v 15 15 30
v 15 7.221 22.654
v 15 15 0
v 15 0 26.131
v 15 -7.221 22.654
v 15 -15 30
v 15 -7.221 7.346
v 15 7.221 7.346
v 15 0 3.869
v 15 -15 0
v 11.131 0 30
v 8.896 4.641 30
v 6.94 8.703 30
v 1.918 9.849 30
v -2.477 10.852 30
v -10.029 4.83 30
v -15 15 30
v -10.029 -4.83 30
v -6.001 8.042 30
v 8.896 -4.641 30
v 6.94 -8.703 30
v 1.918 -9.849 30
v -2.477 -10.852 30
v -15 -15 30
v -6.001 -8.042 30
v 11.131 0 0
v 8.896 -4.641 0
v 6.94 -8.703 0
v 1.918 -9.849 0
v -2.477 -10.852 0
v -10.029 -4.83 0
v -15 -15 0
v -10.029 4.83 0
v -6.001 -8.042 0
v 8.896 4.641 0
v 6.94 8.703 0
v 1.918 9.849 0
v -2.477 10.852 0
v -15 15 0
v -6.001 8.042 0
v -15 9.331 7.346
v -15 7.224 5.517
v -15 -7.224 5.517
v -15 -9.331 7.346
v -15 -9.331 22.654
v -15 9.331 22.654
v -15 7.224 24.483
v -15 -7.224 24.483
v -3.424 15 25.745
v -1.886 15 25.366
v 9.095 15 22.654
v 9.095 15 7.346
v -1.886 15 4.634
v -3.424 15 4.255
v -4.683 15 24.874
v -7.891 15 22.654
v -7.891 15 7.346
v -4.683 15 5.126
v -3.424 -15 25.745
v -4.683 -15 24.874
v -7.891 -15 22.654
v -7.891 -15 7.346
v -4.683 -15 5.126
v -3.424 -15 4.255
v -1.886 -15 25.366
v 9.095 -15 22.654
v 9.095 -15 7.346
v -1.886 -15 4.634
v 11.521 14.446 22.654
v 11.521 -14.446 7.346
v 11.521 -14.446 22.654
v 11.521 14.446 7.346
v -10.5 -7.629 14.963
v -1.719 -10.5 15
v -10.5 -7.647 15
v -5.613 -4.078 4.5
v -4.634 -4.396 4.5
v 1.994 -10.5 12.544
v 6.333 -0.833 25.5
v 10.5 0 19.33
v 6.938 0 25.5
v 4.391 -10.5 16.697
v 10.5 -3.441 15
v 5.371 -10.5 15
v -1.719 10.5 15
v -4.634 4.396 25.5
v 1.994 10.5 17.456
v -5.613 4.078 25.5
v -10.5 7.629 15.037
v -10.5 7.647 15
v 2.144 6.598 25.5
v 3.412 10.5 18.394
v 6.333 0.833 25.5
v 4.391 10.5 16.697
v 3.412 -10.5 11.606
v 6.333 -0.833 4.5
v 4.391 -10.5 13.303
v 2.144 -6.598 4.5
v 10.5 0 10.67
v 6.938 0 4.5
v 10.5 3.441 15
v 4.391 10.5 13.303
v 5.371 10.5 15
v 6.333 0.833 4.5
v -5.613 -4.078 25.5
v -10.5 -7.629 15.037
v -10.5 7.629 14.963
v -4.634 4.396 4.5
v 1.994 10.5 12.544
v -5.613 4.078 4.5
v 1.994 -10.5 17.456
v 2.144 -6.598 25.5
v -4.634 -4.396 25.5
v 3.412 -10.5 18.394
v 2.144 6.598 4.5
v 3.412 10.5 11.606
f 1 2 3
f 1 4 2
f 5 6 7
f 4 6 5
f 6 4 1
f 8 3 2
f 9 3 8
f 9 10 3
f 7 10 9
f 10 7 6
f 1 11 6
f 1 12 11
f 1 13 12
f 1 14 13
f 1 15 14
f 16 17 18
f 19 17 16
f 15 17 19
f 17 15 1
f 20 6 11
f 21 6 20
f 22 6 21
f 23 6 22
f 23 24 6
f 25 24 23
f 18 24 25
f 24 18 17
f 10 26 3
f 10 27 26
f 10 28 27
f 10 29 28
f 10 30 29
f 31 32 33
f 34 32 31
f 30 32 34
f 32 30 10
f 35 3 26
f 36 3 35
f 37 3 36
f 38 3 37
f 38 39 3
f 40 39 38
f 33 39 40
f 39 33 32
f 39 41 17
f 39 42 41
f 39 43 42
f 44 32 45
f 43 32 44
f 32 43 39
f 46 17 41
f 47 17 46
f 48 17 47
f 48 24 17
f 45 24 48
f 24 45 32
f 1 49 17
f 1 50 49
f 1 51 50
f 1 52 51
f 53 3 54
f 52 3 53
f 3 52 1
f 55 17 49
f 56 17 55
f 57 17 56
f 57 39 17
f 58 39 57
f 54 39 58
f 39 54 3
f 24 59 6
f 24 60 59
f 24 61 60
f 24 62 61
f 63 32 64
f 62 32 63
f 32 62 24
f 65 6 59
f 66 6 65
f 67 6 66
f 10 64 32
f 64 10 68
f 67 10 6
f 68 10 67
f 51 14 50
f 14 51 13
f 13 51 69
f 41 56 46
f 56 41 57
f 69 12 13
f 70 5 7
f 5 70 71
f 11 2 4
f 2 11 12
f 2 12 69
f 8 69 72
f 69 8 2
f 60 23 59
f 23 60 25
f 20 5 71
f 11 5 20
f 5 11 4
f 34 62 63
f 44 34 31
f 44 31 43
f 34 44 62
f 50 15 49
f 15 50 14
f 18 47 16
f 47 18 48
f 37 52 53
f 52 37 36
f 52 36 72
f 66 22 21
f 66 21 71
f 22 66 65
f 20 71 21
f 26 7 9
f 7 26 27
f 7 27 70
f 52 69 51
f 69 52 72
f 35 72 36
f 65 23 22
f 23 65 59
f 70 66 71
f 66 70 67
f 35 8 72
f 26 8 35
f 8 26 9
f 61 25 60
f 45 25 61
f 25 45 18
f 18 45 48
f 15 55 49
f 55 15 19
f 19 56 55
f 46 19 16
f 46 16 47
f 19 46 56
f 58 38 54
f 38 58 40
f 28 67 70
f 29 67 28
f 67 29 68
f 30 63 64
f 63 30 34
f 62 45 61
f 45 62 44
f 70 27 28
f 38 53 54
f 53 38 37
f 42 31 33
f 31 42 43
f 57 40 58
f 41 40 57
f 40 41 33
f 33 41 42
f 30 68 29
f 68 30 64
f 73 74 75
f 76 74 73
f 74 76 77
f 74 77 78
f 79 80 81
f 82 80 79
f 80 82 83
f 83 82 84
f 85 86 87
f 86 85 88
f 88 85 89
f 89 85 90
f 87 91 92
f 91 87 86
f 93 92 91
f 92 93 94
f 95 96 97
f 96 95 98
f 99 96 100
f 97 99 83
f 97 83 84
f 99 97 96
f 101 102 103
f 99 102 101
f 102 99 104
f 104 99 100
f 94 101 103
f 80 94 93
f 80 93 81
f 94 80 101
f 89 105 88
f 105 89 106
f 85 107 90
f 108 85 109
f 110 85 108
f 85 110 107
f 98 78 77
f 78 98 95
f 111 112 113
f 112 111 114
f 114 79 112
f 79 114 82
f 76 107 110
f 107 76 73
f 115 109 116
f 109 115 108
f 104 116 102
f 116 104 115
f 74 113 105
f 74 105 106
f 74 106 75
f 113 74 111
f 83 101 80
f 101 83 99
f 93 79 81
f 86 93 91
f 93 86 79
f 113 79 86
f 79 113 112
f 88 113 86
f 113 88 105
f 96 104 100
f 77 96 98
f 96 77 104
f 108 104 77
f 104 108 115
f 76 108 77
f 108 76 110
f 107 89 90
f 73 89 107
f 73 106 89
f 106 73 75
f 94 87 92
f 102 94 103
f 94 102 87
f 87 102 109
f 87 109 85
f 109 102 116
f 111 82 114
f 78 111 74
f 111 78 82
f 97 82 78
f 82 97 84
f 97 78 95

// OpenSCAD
scale(10) translate([0, 0, 1.5])
 union(){
    difference(){
      cube(size= 3, center= true);
      sphere(r= 2, center= true);
    }
    intersection(){
      sphere(r= 1.3, center= true);
      cube(size= 2.1, center=true);
    }
 }
